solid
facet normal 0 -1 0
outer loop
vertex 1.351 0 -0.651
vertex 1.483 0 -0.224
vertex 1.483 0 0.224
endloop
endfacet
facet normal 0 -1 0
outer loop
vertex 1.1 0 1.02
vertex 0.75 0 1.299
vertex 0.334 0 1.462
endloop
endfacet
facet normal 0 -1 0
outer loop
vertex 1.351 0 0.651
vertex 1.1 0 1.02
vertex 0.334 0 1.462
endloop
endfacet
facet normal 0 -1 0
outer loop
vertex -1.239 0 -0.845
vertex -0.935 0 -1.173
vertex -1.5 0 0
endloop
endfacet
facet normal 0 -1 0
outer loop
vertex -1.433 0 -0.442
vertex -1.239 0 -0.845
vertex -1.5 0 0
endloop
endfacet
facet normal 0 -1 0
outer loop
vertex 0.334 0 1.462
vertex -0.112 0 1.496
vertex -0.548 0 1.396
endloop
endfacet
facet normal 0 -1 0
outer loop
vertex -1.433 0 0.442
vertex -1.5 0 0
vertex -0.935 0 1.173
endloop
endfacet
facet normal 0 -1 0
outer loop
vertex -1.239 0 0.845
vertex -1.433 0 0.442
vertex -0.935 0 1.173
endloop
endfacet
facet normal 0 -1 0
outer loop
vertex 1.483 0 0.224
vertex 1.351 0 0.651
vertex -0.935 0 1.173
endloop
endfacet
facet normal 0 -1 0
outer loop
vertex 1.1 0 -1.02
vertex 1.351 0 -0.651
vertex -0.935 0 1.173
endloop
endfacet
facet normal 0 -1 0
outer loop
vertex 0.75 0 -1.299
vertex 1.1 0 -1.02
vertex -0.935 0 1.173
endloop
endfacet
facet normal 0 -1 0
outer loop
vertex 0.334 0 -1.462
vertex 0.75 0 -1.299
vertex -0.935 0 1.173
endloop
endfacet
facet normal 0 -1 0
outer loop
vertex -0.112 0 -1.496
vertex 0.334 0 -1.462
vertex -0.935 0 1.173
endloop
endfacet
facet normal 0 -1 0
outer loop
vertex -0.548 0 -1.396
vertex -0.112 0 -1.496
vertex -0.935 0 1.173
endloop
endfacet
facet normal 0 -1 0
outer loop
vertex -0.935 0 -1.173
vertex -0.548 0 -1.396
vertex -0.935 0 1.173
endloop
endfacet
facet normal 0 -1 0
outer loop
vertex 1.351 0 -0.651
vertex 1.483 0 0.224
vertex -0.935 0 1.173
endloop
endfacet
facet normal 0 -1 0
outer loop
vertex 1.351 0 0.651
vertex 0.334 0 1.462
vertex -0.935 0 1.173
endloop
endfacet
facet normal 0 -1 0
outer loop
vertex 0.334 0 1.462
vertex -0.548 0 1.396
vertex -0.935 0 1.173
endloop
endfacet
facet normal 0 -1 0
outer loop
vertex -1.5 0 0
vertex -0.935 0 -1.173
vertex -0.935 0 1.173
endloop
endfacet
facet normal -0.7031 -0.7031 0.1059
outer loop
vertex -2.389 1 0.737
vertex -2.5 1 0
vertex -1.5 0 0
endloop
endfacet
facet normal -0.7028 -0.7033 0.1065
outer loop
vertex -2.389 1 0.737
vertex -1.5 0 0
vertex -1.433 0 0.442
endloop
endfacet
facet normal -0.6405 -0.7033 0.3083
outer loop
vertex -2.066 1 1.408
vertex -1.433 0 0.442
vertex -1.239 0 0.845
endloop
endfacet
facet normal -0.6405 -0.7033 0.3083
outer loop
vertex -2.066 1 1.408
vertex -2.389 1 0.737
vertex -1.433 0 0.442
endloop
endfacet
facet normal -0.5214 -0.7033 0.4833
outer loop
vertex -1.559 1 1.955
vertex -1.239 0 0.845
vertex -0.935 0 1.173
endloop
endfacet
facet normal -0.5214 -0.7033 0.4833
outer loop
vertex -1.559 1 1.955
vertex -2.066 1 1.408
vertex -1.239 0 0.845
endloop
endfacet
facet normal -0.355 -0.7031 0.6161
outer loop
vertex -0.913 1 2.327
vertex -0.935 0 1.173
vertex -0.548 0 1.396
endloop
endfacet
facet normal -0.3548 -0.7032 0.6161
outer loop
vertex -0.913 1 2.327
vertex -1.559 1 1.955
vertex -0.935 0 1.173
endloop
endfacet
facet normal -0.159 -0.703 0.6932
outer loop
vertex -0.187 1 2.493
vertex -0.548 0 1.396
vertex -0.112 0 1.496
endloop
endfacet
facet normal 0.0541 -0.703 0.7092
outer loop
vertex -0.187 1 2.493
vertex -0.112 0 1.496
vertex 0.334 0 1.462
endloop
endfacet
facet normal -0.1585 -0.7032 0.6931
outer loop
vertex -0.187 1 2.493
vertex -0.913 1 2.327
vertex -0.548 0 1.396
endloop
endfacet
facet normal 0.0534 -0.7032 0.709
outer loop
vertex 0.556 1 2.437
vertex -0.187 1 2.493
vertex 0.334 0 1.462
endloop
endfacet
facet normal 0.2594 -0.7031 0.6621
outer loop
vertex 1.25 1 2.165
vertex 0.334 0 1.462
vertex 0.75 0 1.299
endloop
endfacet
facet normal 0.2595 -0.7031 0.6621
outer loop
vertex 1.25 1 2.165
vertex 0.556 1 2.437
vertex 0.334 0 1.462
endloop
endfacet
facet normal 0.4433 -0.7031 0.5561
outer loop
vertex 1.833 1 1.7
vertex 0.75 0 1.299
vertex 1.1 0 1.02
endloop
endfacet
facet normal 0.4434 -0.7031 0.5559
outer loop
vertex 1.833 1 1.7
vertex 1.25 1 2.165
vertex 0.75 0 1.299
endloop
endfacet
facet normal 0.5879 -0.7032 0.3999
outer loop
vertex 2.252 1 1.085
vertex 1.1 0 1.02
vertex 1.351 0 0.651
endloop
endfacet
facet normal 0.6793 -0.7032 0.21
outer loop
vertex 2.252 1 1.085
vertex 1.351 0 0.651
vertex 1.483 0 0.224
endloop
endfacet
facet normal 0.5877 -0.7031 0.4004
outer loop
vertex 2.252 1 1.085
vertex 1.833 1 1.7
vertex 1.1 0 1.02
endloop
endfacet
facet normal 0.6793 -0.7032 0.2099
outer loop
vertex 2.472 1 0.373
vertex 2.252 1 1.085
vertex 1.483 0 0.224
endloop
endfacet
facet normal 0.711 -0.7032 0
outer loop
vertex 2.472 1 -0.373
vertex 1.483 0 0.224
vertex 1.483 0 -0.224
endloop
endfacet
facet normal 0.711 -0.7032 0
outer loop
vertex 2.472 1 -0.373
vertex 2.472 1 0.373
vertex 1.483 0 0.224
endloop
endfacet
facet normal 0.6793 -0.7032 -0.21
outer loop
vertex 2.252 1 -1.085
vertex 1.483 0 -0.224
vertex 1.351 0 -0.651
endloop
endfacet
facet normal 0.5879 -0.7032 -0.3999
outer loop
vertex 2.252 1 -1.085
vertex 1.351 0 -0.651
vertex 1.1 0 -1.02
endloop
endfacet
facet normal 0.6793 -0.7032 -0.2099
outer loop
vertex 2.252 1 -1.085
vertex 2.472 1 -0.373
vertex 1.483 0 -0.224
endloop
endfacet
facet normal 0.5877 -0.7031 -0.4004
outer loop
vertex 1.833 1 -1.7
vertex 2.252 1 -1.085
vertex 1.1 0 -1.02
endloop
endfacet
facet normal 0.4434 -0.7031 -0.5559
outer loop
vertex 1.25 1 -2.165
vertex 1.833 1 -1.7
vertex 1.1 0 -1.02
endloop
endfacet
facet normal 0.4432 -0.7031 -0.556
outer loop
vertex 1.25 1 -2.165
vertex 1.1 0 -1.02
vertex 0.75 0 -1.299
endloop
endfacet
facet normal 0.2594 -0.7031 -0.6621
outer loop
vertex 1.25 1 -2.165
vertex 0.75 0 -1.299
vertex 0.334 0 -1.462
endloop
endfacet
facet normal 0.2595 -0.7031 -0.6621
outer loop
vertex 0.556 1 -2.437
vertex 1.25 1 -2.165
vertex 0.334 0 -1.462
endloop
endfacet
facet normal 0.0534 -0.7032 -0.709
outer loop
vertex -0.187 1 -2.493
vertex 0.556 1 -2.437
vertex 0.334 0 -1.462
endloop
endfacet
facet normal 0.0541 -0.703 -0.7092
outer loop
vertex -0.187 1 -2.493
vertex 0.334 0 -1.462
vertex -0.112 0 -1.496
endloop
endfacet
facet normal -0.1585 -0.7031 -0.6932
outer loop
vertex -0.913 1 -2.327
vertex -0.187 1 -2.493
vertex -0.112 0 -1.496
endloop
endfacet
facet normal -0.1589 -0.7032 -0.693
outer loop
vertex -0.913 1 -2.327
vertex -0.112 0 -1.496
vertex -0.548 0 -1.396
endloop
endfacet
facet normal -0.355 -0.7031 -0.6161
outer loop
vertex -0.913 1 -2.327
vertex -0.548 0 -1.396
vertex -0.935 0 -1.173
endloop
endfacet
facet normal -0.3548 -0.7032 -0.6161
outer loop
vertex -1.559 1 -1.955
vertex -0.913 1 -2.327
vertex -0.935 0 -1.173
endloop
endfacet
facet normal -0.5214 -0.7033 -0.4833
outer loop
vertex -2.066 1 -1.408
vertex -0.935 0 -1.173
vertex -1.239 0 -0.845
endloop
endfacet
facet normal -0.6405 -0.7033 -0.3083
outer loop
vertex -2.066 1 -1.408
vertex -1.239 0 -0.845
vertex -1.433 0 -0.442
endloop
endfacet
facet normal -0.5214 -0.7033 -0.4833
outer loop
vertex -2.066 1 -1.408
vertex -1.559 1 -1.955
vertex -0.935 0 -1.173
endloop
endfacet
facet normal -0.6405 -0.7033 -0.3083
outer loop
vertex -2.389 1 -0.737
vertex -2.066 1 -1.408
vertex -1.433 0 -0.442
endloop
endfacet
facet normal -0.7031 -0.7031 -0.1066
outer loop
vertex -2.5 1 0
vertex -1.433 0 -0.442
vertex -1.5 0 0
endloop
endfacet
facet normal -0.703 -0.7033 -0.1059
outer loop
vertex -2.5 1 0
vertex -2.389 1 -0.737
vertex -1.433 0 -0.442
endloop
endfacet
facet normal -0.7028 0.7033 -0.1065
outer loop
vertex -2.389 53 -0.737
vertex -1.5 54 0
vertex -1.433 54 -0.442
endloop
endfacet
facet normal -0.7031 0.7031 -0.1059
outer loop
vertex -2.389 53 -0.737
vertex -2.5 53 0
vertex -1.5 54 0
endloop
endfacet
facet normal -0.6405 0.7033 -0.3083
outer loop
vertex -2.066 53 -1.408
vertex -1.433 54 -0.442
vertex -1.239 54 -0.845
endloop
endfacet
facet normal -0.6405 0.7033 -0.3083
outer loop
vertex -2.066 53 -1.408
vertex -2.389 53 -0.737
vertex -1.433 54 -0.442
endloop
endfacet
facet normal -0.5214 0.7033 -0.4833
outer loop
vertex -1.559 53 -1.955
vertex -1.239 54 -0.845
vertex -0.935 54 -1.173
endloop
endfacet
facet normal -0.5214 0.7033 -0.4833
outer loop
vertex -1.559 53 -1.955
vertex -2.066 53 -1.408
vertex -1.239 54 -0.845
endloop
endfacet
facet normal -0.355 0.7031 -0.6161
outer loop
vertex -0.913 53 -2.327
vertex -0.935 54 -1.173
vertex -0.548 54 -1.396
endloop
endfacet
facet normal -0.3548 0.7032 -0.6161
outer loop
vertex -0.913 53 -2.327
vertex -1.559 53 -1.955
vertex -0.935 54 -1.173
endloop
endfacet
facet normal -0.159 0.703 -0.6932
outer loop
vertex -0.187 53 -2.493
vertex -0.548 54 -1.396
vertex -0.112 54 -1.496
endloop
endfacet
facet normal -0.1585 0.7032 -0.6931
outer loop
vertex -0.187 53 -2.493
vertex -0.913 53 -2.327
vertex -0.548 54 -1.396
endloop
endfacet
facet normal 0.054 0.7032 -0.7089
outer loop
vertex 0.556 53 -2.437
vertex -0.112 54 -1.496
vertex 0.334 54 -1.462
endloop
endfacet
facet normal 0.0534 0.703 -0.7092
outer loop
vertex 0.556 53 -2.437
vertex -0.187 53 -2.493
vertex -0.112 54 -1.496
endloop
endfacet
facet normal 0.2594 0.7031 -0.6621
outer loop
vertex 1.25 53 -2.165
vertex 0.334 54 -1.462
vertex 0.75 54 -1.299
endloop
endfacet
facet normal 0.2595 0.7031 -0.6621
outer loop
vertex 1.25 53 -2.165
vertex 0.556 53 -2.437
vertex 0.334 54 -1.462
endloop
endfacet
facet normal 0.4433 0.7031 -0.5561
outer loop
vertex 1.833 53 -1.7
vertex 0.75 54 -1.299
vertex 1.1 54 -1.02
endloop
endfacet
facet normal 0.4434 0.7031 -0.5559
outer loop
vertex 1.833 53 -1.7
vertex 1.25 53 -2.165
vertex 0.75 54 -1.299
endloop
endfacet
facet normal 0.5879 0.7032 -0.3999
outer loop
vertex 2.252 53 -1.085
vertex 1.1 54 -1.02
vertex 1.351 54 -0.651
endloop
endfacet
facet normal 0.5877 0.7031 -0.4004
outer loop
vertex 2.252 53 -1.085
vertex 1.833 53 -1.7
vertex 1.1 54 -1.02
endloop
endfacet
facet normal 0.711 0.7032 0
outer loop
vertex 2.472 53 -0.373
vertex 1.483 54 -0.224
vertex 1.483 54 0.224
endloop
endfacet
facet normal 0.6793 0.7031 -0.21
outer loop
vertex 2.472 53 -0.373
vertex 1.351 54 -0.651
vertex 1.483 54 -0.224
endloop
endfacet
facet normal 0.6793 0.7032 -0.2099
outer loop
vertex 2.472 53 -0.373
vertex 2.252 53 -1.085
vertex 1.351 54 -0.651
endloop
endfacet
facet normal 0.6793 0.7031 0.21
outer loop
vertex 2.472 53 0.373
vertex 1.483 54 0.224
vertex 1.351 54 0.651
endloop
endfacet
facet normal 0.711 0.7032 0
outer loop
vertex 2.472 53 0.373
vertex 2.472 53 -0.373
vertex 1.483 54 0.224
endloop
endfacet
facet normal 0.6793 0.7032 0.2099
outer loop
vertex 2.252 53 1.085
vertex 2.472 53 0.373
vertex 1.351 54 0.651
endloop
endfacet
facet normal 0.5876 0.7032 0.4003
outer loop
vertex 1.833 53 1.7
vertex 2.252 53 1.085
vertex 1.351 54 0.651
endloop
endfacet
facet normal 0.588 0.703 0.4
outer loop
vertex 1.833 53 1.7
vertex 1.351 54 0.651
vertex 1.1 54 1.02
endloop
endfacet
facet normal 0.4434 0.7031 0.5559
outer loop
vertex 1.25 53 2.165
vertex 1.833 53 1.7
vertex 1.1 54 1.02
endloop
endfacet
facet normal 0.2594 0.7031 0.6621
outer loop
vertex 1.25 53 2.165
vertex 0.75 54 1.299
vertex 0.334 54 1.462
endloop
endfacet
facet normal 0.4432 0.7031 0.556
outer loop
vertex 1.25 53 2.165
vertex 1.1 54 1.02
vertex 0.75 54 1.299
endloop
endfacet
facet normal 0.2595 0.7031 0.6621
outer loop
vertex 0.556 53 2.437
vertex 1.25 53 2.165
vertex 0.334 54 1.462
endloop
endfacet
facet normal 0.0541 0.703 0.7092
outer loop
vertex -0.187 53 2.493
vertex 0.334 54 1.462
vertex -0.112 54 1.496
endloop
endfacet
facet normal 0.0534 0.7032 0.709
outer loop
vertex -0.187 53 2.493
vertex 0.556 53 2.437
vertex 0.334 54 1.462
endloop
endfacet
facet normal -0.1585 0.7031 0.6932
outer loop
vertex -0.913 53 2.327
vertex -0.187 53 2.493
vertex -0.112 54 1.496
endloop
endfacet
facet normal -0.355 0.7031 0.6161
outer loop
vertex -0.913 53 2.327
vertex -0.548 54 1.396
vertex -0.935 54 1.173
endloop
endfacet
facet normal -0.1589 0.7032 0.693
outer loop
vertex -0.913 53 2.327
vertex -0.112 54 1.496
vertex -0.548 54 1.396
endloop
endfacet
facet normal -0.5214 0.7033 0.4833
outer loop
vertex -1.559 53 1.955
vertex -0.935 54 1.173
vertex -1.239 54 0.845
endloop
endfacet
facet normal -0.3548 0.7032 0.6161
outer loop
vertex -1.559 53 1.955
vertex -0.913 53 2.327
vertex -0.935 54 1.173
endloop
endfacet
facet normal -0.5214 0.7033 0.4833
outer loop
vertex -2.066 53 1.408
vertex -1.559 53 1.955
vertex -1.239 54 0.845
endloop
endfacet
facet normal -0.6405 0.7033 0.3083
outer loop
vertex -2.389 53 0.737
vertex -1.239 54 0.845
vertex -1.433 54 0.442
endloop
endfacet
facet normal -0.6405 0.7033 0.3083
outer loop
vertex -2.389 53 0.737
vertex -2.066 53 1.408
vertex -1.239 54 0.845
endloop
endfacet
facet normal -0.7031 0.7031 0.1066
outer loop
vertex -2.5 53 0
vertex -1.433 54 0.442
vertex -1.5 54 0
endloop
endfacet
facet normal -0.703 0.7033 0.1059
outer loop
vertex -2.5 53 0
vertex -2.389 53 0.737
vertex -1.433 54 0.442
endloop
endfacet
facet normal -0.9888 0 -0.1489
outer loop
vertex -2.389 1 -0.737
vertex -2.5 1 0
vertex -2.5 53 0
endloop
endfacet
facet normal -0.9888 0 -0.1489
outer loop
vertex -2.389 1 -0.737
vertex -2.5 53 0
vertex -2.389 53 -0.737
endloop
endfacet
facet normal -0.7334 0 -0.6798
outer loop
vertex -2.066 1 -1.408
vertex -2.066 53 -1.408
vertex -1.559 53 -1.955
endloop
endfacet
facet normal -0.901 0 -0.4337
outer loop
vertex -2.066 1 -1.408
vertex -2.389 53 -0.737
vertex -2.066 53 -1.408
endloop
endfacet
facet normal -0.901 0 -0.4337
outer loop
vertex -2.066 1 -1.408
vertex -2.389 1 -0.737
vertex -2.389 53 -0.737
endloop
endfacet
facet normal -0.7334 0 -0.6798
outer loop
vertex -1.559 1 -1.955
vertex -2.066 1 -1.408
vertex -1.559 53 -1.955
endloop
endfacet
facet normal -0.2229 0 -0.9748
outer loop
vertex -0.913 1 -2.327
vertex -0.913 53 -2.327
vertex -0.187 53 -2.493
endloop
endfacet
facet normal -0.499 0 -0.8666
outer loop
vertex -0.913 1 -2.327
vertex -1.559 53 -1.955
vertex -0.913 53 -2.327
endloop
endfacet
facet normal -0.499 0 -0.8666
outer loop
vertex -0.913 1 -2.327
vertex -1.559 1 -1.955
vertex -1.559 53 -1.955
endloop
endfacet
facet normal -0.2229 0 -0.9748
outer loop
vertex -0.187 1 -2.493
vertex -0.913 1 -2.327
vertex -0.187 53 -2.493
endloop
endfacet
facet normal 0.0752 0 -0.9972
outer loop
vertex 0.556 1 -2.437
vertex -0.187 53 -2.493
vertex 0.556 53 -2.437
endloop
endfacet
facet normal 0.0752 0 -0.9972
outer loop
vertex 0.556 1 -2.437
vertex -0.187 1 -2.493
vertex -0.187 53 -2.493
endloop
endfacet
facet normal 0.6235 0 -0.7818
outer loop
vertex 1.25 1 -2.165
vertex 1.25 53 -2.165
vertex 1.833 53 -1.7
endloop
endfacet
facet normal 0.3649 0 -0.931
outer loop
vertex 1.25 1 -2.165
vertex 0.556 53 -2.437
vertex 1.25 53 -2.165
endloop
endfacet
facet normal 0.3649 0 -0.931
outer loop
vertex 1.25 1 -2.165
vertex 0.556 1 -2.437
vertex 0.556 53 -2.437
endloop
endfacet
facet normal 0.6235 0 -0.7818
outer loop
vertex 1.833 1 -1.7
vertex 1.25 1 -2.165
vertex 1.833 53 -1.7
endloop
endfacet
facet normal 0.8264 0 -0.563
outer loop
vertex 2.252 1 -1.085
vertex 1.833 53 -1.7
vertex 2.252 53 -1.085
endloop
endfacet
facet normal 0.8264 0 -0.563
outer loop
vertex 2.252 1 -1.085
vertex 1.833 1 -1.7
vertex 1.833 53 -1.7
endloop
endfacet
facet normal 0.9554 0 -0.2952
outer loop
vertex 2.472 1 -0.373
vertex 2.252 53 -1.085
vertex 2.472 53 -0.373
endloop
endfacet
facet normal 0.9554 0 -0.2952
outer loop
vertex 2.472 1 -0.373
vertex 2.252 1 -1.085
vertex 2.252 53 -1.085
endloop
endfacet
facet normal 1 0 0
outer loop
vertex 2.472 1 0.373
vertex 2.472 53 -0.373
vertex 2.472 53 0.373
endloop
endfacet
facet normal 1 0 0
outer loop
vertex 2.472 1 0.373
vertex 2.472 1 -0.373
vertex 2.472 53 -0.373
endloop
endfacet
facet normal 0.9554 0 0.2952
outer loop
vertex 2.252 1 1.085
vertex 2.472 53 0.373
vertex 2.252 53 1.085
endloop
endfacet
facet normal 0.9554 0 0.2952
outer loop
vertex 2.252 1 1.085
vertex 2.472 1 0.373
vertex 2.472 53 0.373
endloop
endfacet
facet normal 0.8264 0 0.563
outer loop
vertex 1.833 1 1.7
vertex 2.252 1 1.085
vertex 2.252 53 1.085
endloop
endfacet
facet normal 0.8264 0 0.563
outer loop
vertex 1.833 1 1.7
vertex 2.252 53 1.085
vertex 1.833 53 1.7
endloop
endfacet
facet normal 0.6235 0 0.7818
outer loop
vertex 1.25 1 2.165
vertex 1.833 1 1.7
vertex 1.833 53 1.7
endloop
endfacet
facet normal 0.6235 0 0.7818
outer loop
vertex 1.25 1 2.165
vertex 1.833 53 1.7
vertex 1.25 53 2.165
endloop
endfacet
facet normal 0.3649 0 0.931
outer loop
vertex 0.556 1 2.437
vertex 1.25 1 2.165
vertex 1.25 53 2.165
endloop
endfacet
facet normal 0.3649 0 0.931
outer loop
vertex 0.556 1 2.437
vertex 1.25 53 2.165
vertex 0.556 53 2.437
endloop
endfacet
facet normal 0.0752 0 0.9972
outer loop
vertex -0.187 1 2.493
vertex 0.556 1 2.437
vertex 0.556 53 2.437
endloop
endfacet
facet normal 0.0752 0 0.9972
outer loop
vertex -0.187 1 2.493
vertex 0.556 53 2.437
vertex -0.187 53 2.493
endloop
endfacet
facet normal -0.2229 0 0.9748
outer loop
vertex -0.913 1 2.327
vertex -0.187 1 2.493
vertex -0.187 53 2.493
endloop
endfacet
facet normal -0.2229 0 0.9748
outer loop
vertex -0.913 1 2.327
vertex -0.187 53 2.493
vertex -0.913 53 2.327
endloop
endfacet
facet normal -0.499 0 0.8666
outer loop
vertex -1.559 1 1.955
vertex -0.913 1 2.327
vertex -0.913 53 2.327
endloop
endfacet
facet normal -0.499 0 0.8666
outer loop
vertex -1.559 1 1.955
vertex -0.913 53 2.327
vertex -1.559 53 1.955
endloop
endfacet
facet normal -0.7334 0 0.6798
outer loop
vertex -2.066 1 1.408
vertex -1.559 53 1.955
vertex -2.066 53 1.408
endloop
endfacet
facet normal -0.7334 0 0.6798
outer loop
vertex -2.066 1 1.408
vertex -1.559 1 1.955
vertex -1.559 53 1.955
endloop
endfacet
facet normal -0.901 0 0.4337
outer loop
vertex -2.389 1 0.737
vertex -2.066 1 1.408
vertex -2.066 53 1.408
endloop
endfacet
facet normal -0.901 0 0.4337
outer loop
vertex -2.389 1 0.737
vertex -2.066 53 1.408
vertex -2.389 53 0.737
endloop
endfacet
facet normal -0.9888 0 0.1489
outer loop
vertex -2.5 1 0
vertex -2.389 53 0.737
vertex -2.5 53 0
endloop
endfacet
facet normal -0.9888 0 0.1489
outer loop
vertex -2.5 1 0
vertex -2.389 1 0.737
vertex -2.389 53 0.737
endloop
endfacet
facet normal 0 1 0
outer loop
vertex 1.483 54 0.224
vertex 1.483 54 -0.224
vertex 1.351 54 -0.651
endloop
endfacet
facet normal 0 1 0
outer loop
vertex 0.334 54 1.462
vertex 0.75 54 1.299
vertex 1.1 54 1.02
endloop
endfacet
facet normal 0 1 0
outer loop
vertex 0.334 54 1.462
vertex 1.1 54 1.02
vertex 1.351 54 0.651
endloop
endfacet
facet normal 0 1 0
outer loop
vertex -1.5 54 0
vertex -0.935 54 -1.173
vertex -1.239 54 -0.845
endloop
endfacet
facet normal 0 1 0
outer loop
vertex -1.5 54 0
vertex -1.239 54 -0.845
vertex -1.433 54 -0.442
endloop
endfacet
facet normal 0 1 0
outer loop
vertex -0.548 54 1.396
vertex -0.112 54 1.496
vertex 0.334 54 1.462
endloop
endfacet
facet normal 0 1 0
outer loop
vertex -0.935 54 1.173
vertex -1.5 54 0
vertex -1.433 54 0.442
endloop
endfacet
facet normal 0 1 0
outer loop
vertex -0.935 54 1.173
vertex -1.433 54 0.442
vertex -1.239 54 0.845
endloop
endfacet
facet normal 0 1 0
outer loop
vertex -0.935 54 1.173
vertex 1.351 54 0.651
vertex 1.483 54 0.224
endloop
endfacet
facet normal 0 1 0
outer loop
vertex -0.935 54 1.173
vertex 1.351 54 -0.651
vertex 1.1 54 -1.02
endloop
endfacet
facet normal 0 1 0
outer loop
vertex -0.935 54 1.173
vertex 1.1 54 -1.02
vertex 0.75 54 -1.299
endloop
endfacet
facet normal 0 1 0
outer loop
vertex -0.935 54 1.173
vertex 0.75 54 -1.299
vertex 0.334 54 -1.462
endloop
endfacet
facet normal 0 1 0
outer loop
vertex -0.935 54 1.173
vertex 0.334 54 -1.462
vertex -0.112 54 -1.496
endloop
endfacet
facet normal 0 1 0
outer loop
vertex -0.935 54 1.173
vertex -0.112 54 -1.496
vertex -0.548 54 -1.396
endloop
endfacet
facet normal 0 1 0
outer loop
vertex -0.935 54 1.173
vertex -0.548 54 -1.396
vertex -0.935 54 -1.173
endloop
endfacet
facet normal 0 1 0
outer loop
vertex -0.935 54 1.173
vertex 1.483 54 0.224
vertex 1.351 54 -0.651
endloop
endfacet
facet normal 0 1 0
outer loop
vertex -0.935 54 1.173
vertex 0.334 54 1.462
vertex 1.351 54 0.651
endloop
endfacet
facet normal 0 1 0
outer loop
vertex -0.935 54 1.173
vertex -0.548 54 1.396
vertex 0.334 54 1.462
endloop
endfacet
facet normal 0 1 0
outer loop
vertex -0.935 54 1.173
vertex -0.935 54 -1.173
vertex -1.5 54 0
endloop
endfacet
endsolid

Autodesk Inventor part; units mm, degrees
ref_plane "YZ Plane" through (0, 0, 0) normal (1, 0, 0) x (0, 1, 0)
ref_plane "XZ Plane" through (0, 0, 0) normal (0, 1, 0) x (-1, 0, 0)
ref_plane "XY Plane" through (0, 0, 0) normal (0, 0, 1) x (1, 0, 0)
sketch "Sketch1" plane through (0, 0, 0) normal (0, 1, 0) x (-1, 0, 0)
  circle A0 centre (0, 0) radius 2.5
  dimension "d0" = 5
extrude "Extrusion1" add sketch "Sketch1" along normal blind 54
chamfer "Chamfer1" distance 1 angle 45 1 edges at (2.5, 54, 0)
chamfer "Chamfer2" distance 1 angle 45 1 edges at (2.5, 0, 0)
properties part number "Cannon_support_pin" material "Steel, High Strength, Low Alloy"
